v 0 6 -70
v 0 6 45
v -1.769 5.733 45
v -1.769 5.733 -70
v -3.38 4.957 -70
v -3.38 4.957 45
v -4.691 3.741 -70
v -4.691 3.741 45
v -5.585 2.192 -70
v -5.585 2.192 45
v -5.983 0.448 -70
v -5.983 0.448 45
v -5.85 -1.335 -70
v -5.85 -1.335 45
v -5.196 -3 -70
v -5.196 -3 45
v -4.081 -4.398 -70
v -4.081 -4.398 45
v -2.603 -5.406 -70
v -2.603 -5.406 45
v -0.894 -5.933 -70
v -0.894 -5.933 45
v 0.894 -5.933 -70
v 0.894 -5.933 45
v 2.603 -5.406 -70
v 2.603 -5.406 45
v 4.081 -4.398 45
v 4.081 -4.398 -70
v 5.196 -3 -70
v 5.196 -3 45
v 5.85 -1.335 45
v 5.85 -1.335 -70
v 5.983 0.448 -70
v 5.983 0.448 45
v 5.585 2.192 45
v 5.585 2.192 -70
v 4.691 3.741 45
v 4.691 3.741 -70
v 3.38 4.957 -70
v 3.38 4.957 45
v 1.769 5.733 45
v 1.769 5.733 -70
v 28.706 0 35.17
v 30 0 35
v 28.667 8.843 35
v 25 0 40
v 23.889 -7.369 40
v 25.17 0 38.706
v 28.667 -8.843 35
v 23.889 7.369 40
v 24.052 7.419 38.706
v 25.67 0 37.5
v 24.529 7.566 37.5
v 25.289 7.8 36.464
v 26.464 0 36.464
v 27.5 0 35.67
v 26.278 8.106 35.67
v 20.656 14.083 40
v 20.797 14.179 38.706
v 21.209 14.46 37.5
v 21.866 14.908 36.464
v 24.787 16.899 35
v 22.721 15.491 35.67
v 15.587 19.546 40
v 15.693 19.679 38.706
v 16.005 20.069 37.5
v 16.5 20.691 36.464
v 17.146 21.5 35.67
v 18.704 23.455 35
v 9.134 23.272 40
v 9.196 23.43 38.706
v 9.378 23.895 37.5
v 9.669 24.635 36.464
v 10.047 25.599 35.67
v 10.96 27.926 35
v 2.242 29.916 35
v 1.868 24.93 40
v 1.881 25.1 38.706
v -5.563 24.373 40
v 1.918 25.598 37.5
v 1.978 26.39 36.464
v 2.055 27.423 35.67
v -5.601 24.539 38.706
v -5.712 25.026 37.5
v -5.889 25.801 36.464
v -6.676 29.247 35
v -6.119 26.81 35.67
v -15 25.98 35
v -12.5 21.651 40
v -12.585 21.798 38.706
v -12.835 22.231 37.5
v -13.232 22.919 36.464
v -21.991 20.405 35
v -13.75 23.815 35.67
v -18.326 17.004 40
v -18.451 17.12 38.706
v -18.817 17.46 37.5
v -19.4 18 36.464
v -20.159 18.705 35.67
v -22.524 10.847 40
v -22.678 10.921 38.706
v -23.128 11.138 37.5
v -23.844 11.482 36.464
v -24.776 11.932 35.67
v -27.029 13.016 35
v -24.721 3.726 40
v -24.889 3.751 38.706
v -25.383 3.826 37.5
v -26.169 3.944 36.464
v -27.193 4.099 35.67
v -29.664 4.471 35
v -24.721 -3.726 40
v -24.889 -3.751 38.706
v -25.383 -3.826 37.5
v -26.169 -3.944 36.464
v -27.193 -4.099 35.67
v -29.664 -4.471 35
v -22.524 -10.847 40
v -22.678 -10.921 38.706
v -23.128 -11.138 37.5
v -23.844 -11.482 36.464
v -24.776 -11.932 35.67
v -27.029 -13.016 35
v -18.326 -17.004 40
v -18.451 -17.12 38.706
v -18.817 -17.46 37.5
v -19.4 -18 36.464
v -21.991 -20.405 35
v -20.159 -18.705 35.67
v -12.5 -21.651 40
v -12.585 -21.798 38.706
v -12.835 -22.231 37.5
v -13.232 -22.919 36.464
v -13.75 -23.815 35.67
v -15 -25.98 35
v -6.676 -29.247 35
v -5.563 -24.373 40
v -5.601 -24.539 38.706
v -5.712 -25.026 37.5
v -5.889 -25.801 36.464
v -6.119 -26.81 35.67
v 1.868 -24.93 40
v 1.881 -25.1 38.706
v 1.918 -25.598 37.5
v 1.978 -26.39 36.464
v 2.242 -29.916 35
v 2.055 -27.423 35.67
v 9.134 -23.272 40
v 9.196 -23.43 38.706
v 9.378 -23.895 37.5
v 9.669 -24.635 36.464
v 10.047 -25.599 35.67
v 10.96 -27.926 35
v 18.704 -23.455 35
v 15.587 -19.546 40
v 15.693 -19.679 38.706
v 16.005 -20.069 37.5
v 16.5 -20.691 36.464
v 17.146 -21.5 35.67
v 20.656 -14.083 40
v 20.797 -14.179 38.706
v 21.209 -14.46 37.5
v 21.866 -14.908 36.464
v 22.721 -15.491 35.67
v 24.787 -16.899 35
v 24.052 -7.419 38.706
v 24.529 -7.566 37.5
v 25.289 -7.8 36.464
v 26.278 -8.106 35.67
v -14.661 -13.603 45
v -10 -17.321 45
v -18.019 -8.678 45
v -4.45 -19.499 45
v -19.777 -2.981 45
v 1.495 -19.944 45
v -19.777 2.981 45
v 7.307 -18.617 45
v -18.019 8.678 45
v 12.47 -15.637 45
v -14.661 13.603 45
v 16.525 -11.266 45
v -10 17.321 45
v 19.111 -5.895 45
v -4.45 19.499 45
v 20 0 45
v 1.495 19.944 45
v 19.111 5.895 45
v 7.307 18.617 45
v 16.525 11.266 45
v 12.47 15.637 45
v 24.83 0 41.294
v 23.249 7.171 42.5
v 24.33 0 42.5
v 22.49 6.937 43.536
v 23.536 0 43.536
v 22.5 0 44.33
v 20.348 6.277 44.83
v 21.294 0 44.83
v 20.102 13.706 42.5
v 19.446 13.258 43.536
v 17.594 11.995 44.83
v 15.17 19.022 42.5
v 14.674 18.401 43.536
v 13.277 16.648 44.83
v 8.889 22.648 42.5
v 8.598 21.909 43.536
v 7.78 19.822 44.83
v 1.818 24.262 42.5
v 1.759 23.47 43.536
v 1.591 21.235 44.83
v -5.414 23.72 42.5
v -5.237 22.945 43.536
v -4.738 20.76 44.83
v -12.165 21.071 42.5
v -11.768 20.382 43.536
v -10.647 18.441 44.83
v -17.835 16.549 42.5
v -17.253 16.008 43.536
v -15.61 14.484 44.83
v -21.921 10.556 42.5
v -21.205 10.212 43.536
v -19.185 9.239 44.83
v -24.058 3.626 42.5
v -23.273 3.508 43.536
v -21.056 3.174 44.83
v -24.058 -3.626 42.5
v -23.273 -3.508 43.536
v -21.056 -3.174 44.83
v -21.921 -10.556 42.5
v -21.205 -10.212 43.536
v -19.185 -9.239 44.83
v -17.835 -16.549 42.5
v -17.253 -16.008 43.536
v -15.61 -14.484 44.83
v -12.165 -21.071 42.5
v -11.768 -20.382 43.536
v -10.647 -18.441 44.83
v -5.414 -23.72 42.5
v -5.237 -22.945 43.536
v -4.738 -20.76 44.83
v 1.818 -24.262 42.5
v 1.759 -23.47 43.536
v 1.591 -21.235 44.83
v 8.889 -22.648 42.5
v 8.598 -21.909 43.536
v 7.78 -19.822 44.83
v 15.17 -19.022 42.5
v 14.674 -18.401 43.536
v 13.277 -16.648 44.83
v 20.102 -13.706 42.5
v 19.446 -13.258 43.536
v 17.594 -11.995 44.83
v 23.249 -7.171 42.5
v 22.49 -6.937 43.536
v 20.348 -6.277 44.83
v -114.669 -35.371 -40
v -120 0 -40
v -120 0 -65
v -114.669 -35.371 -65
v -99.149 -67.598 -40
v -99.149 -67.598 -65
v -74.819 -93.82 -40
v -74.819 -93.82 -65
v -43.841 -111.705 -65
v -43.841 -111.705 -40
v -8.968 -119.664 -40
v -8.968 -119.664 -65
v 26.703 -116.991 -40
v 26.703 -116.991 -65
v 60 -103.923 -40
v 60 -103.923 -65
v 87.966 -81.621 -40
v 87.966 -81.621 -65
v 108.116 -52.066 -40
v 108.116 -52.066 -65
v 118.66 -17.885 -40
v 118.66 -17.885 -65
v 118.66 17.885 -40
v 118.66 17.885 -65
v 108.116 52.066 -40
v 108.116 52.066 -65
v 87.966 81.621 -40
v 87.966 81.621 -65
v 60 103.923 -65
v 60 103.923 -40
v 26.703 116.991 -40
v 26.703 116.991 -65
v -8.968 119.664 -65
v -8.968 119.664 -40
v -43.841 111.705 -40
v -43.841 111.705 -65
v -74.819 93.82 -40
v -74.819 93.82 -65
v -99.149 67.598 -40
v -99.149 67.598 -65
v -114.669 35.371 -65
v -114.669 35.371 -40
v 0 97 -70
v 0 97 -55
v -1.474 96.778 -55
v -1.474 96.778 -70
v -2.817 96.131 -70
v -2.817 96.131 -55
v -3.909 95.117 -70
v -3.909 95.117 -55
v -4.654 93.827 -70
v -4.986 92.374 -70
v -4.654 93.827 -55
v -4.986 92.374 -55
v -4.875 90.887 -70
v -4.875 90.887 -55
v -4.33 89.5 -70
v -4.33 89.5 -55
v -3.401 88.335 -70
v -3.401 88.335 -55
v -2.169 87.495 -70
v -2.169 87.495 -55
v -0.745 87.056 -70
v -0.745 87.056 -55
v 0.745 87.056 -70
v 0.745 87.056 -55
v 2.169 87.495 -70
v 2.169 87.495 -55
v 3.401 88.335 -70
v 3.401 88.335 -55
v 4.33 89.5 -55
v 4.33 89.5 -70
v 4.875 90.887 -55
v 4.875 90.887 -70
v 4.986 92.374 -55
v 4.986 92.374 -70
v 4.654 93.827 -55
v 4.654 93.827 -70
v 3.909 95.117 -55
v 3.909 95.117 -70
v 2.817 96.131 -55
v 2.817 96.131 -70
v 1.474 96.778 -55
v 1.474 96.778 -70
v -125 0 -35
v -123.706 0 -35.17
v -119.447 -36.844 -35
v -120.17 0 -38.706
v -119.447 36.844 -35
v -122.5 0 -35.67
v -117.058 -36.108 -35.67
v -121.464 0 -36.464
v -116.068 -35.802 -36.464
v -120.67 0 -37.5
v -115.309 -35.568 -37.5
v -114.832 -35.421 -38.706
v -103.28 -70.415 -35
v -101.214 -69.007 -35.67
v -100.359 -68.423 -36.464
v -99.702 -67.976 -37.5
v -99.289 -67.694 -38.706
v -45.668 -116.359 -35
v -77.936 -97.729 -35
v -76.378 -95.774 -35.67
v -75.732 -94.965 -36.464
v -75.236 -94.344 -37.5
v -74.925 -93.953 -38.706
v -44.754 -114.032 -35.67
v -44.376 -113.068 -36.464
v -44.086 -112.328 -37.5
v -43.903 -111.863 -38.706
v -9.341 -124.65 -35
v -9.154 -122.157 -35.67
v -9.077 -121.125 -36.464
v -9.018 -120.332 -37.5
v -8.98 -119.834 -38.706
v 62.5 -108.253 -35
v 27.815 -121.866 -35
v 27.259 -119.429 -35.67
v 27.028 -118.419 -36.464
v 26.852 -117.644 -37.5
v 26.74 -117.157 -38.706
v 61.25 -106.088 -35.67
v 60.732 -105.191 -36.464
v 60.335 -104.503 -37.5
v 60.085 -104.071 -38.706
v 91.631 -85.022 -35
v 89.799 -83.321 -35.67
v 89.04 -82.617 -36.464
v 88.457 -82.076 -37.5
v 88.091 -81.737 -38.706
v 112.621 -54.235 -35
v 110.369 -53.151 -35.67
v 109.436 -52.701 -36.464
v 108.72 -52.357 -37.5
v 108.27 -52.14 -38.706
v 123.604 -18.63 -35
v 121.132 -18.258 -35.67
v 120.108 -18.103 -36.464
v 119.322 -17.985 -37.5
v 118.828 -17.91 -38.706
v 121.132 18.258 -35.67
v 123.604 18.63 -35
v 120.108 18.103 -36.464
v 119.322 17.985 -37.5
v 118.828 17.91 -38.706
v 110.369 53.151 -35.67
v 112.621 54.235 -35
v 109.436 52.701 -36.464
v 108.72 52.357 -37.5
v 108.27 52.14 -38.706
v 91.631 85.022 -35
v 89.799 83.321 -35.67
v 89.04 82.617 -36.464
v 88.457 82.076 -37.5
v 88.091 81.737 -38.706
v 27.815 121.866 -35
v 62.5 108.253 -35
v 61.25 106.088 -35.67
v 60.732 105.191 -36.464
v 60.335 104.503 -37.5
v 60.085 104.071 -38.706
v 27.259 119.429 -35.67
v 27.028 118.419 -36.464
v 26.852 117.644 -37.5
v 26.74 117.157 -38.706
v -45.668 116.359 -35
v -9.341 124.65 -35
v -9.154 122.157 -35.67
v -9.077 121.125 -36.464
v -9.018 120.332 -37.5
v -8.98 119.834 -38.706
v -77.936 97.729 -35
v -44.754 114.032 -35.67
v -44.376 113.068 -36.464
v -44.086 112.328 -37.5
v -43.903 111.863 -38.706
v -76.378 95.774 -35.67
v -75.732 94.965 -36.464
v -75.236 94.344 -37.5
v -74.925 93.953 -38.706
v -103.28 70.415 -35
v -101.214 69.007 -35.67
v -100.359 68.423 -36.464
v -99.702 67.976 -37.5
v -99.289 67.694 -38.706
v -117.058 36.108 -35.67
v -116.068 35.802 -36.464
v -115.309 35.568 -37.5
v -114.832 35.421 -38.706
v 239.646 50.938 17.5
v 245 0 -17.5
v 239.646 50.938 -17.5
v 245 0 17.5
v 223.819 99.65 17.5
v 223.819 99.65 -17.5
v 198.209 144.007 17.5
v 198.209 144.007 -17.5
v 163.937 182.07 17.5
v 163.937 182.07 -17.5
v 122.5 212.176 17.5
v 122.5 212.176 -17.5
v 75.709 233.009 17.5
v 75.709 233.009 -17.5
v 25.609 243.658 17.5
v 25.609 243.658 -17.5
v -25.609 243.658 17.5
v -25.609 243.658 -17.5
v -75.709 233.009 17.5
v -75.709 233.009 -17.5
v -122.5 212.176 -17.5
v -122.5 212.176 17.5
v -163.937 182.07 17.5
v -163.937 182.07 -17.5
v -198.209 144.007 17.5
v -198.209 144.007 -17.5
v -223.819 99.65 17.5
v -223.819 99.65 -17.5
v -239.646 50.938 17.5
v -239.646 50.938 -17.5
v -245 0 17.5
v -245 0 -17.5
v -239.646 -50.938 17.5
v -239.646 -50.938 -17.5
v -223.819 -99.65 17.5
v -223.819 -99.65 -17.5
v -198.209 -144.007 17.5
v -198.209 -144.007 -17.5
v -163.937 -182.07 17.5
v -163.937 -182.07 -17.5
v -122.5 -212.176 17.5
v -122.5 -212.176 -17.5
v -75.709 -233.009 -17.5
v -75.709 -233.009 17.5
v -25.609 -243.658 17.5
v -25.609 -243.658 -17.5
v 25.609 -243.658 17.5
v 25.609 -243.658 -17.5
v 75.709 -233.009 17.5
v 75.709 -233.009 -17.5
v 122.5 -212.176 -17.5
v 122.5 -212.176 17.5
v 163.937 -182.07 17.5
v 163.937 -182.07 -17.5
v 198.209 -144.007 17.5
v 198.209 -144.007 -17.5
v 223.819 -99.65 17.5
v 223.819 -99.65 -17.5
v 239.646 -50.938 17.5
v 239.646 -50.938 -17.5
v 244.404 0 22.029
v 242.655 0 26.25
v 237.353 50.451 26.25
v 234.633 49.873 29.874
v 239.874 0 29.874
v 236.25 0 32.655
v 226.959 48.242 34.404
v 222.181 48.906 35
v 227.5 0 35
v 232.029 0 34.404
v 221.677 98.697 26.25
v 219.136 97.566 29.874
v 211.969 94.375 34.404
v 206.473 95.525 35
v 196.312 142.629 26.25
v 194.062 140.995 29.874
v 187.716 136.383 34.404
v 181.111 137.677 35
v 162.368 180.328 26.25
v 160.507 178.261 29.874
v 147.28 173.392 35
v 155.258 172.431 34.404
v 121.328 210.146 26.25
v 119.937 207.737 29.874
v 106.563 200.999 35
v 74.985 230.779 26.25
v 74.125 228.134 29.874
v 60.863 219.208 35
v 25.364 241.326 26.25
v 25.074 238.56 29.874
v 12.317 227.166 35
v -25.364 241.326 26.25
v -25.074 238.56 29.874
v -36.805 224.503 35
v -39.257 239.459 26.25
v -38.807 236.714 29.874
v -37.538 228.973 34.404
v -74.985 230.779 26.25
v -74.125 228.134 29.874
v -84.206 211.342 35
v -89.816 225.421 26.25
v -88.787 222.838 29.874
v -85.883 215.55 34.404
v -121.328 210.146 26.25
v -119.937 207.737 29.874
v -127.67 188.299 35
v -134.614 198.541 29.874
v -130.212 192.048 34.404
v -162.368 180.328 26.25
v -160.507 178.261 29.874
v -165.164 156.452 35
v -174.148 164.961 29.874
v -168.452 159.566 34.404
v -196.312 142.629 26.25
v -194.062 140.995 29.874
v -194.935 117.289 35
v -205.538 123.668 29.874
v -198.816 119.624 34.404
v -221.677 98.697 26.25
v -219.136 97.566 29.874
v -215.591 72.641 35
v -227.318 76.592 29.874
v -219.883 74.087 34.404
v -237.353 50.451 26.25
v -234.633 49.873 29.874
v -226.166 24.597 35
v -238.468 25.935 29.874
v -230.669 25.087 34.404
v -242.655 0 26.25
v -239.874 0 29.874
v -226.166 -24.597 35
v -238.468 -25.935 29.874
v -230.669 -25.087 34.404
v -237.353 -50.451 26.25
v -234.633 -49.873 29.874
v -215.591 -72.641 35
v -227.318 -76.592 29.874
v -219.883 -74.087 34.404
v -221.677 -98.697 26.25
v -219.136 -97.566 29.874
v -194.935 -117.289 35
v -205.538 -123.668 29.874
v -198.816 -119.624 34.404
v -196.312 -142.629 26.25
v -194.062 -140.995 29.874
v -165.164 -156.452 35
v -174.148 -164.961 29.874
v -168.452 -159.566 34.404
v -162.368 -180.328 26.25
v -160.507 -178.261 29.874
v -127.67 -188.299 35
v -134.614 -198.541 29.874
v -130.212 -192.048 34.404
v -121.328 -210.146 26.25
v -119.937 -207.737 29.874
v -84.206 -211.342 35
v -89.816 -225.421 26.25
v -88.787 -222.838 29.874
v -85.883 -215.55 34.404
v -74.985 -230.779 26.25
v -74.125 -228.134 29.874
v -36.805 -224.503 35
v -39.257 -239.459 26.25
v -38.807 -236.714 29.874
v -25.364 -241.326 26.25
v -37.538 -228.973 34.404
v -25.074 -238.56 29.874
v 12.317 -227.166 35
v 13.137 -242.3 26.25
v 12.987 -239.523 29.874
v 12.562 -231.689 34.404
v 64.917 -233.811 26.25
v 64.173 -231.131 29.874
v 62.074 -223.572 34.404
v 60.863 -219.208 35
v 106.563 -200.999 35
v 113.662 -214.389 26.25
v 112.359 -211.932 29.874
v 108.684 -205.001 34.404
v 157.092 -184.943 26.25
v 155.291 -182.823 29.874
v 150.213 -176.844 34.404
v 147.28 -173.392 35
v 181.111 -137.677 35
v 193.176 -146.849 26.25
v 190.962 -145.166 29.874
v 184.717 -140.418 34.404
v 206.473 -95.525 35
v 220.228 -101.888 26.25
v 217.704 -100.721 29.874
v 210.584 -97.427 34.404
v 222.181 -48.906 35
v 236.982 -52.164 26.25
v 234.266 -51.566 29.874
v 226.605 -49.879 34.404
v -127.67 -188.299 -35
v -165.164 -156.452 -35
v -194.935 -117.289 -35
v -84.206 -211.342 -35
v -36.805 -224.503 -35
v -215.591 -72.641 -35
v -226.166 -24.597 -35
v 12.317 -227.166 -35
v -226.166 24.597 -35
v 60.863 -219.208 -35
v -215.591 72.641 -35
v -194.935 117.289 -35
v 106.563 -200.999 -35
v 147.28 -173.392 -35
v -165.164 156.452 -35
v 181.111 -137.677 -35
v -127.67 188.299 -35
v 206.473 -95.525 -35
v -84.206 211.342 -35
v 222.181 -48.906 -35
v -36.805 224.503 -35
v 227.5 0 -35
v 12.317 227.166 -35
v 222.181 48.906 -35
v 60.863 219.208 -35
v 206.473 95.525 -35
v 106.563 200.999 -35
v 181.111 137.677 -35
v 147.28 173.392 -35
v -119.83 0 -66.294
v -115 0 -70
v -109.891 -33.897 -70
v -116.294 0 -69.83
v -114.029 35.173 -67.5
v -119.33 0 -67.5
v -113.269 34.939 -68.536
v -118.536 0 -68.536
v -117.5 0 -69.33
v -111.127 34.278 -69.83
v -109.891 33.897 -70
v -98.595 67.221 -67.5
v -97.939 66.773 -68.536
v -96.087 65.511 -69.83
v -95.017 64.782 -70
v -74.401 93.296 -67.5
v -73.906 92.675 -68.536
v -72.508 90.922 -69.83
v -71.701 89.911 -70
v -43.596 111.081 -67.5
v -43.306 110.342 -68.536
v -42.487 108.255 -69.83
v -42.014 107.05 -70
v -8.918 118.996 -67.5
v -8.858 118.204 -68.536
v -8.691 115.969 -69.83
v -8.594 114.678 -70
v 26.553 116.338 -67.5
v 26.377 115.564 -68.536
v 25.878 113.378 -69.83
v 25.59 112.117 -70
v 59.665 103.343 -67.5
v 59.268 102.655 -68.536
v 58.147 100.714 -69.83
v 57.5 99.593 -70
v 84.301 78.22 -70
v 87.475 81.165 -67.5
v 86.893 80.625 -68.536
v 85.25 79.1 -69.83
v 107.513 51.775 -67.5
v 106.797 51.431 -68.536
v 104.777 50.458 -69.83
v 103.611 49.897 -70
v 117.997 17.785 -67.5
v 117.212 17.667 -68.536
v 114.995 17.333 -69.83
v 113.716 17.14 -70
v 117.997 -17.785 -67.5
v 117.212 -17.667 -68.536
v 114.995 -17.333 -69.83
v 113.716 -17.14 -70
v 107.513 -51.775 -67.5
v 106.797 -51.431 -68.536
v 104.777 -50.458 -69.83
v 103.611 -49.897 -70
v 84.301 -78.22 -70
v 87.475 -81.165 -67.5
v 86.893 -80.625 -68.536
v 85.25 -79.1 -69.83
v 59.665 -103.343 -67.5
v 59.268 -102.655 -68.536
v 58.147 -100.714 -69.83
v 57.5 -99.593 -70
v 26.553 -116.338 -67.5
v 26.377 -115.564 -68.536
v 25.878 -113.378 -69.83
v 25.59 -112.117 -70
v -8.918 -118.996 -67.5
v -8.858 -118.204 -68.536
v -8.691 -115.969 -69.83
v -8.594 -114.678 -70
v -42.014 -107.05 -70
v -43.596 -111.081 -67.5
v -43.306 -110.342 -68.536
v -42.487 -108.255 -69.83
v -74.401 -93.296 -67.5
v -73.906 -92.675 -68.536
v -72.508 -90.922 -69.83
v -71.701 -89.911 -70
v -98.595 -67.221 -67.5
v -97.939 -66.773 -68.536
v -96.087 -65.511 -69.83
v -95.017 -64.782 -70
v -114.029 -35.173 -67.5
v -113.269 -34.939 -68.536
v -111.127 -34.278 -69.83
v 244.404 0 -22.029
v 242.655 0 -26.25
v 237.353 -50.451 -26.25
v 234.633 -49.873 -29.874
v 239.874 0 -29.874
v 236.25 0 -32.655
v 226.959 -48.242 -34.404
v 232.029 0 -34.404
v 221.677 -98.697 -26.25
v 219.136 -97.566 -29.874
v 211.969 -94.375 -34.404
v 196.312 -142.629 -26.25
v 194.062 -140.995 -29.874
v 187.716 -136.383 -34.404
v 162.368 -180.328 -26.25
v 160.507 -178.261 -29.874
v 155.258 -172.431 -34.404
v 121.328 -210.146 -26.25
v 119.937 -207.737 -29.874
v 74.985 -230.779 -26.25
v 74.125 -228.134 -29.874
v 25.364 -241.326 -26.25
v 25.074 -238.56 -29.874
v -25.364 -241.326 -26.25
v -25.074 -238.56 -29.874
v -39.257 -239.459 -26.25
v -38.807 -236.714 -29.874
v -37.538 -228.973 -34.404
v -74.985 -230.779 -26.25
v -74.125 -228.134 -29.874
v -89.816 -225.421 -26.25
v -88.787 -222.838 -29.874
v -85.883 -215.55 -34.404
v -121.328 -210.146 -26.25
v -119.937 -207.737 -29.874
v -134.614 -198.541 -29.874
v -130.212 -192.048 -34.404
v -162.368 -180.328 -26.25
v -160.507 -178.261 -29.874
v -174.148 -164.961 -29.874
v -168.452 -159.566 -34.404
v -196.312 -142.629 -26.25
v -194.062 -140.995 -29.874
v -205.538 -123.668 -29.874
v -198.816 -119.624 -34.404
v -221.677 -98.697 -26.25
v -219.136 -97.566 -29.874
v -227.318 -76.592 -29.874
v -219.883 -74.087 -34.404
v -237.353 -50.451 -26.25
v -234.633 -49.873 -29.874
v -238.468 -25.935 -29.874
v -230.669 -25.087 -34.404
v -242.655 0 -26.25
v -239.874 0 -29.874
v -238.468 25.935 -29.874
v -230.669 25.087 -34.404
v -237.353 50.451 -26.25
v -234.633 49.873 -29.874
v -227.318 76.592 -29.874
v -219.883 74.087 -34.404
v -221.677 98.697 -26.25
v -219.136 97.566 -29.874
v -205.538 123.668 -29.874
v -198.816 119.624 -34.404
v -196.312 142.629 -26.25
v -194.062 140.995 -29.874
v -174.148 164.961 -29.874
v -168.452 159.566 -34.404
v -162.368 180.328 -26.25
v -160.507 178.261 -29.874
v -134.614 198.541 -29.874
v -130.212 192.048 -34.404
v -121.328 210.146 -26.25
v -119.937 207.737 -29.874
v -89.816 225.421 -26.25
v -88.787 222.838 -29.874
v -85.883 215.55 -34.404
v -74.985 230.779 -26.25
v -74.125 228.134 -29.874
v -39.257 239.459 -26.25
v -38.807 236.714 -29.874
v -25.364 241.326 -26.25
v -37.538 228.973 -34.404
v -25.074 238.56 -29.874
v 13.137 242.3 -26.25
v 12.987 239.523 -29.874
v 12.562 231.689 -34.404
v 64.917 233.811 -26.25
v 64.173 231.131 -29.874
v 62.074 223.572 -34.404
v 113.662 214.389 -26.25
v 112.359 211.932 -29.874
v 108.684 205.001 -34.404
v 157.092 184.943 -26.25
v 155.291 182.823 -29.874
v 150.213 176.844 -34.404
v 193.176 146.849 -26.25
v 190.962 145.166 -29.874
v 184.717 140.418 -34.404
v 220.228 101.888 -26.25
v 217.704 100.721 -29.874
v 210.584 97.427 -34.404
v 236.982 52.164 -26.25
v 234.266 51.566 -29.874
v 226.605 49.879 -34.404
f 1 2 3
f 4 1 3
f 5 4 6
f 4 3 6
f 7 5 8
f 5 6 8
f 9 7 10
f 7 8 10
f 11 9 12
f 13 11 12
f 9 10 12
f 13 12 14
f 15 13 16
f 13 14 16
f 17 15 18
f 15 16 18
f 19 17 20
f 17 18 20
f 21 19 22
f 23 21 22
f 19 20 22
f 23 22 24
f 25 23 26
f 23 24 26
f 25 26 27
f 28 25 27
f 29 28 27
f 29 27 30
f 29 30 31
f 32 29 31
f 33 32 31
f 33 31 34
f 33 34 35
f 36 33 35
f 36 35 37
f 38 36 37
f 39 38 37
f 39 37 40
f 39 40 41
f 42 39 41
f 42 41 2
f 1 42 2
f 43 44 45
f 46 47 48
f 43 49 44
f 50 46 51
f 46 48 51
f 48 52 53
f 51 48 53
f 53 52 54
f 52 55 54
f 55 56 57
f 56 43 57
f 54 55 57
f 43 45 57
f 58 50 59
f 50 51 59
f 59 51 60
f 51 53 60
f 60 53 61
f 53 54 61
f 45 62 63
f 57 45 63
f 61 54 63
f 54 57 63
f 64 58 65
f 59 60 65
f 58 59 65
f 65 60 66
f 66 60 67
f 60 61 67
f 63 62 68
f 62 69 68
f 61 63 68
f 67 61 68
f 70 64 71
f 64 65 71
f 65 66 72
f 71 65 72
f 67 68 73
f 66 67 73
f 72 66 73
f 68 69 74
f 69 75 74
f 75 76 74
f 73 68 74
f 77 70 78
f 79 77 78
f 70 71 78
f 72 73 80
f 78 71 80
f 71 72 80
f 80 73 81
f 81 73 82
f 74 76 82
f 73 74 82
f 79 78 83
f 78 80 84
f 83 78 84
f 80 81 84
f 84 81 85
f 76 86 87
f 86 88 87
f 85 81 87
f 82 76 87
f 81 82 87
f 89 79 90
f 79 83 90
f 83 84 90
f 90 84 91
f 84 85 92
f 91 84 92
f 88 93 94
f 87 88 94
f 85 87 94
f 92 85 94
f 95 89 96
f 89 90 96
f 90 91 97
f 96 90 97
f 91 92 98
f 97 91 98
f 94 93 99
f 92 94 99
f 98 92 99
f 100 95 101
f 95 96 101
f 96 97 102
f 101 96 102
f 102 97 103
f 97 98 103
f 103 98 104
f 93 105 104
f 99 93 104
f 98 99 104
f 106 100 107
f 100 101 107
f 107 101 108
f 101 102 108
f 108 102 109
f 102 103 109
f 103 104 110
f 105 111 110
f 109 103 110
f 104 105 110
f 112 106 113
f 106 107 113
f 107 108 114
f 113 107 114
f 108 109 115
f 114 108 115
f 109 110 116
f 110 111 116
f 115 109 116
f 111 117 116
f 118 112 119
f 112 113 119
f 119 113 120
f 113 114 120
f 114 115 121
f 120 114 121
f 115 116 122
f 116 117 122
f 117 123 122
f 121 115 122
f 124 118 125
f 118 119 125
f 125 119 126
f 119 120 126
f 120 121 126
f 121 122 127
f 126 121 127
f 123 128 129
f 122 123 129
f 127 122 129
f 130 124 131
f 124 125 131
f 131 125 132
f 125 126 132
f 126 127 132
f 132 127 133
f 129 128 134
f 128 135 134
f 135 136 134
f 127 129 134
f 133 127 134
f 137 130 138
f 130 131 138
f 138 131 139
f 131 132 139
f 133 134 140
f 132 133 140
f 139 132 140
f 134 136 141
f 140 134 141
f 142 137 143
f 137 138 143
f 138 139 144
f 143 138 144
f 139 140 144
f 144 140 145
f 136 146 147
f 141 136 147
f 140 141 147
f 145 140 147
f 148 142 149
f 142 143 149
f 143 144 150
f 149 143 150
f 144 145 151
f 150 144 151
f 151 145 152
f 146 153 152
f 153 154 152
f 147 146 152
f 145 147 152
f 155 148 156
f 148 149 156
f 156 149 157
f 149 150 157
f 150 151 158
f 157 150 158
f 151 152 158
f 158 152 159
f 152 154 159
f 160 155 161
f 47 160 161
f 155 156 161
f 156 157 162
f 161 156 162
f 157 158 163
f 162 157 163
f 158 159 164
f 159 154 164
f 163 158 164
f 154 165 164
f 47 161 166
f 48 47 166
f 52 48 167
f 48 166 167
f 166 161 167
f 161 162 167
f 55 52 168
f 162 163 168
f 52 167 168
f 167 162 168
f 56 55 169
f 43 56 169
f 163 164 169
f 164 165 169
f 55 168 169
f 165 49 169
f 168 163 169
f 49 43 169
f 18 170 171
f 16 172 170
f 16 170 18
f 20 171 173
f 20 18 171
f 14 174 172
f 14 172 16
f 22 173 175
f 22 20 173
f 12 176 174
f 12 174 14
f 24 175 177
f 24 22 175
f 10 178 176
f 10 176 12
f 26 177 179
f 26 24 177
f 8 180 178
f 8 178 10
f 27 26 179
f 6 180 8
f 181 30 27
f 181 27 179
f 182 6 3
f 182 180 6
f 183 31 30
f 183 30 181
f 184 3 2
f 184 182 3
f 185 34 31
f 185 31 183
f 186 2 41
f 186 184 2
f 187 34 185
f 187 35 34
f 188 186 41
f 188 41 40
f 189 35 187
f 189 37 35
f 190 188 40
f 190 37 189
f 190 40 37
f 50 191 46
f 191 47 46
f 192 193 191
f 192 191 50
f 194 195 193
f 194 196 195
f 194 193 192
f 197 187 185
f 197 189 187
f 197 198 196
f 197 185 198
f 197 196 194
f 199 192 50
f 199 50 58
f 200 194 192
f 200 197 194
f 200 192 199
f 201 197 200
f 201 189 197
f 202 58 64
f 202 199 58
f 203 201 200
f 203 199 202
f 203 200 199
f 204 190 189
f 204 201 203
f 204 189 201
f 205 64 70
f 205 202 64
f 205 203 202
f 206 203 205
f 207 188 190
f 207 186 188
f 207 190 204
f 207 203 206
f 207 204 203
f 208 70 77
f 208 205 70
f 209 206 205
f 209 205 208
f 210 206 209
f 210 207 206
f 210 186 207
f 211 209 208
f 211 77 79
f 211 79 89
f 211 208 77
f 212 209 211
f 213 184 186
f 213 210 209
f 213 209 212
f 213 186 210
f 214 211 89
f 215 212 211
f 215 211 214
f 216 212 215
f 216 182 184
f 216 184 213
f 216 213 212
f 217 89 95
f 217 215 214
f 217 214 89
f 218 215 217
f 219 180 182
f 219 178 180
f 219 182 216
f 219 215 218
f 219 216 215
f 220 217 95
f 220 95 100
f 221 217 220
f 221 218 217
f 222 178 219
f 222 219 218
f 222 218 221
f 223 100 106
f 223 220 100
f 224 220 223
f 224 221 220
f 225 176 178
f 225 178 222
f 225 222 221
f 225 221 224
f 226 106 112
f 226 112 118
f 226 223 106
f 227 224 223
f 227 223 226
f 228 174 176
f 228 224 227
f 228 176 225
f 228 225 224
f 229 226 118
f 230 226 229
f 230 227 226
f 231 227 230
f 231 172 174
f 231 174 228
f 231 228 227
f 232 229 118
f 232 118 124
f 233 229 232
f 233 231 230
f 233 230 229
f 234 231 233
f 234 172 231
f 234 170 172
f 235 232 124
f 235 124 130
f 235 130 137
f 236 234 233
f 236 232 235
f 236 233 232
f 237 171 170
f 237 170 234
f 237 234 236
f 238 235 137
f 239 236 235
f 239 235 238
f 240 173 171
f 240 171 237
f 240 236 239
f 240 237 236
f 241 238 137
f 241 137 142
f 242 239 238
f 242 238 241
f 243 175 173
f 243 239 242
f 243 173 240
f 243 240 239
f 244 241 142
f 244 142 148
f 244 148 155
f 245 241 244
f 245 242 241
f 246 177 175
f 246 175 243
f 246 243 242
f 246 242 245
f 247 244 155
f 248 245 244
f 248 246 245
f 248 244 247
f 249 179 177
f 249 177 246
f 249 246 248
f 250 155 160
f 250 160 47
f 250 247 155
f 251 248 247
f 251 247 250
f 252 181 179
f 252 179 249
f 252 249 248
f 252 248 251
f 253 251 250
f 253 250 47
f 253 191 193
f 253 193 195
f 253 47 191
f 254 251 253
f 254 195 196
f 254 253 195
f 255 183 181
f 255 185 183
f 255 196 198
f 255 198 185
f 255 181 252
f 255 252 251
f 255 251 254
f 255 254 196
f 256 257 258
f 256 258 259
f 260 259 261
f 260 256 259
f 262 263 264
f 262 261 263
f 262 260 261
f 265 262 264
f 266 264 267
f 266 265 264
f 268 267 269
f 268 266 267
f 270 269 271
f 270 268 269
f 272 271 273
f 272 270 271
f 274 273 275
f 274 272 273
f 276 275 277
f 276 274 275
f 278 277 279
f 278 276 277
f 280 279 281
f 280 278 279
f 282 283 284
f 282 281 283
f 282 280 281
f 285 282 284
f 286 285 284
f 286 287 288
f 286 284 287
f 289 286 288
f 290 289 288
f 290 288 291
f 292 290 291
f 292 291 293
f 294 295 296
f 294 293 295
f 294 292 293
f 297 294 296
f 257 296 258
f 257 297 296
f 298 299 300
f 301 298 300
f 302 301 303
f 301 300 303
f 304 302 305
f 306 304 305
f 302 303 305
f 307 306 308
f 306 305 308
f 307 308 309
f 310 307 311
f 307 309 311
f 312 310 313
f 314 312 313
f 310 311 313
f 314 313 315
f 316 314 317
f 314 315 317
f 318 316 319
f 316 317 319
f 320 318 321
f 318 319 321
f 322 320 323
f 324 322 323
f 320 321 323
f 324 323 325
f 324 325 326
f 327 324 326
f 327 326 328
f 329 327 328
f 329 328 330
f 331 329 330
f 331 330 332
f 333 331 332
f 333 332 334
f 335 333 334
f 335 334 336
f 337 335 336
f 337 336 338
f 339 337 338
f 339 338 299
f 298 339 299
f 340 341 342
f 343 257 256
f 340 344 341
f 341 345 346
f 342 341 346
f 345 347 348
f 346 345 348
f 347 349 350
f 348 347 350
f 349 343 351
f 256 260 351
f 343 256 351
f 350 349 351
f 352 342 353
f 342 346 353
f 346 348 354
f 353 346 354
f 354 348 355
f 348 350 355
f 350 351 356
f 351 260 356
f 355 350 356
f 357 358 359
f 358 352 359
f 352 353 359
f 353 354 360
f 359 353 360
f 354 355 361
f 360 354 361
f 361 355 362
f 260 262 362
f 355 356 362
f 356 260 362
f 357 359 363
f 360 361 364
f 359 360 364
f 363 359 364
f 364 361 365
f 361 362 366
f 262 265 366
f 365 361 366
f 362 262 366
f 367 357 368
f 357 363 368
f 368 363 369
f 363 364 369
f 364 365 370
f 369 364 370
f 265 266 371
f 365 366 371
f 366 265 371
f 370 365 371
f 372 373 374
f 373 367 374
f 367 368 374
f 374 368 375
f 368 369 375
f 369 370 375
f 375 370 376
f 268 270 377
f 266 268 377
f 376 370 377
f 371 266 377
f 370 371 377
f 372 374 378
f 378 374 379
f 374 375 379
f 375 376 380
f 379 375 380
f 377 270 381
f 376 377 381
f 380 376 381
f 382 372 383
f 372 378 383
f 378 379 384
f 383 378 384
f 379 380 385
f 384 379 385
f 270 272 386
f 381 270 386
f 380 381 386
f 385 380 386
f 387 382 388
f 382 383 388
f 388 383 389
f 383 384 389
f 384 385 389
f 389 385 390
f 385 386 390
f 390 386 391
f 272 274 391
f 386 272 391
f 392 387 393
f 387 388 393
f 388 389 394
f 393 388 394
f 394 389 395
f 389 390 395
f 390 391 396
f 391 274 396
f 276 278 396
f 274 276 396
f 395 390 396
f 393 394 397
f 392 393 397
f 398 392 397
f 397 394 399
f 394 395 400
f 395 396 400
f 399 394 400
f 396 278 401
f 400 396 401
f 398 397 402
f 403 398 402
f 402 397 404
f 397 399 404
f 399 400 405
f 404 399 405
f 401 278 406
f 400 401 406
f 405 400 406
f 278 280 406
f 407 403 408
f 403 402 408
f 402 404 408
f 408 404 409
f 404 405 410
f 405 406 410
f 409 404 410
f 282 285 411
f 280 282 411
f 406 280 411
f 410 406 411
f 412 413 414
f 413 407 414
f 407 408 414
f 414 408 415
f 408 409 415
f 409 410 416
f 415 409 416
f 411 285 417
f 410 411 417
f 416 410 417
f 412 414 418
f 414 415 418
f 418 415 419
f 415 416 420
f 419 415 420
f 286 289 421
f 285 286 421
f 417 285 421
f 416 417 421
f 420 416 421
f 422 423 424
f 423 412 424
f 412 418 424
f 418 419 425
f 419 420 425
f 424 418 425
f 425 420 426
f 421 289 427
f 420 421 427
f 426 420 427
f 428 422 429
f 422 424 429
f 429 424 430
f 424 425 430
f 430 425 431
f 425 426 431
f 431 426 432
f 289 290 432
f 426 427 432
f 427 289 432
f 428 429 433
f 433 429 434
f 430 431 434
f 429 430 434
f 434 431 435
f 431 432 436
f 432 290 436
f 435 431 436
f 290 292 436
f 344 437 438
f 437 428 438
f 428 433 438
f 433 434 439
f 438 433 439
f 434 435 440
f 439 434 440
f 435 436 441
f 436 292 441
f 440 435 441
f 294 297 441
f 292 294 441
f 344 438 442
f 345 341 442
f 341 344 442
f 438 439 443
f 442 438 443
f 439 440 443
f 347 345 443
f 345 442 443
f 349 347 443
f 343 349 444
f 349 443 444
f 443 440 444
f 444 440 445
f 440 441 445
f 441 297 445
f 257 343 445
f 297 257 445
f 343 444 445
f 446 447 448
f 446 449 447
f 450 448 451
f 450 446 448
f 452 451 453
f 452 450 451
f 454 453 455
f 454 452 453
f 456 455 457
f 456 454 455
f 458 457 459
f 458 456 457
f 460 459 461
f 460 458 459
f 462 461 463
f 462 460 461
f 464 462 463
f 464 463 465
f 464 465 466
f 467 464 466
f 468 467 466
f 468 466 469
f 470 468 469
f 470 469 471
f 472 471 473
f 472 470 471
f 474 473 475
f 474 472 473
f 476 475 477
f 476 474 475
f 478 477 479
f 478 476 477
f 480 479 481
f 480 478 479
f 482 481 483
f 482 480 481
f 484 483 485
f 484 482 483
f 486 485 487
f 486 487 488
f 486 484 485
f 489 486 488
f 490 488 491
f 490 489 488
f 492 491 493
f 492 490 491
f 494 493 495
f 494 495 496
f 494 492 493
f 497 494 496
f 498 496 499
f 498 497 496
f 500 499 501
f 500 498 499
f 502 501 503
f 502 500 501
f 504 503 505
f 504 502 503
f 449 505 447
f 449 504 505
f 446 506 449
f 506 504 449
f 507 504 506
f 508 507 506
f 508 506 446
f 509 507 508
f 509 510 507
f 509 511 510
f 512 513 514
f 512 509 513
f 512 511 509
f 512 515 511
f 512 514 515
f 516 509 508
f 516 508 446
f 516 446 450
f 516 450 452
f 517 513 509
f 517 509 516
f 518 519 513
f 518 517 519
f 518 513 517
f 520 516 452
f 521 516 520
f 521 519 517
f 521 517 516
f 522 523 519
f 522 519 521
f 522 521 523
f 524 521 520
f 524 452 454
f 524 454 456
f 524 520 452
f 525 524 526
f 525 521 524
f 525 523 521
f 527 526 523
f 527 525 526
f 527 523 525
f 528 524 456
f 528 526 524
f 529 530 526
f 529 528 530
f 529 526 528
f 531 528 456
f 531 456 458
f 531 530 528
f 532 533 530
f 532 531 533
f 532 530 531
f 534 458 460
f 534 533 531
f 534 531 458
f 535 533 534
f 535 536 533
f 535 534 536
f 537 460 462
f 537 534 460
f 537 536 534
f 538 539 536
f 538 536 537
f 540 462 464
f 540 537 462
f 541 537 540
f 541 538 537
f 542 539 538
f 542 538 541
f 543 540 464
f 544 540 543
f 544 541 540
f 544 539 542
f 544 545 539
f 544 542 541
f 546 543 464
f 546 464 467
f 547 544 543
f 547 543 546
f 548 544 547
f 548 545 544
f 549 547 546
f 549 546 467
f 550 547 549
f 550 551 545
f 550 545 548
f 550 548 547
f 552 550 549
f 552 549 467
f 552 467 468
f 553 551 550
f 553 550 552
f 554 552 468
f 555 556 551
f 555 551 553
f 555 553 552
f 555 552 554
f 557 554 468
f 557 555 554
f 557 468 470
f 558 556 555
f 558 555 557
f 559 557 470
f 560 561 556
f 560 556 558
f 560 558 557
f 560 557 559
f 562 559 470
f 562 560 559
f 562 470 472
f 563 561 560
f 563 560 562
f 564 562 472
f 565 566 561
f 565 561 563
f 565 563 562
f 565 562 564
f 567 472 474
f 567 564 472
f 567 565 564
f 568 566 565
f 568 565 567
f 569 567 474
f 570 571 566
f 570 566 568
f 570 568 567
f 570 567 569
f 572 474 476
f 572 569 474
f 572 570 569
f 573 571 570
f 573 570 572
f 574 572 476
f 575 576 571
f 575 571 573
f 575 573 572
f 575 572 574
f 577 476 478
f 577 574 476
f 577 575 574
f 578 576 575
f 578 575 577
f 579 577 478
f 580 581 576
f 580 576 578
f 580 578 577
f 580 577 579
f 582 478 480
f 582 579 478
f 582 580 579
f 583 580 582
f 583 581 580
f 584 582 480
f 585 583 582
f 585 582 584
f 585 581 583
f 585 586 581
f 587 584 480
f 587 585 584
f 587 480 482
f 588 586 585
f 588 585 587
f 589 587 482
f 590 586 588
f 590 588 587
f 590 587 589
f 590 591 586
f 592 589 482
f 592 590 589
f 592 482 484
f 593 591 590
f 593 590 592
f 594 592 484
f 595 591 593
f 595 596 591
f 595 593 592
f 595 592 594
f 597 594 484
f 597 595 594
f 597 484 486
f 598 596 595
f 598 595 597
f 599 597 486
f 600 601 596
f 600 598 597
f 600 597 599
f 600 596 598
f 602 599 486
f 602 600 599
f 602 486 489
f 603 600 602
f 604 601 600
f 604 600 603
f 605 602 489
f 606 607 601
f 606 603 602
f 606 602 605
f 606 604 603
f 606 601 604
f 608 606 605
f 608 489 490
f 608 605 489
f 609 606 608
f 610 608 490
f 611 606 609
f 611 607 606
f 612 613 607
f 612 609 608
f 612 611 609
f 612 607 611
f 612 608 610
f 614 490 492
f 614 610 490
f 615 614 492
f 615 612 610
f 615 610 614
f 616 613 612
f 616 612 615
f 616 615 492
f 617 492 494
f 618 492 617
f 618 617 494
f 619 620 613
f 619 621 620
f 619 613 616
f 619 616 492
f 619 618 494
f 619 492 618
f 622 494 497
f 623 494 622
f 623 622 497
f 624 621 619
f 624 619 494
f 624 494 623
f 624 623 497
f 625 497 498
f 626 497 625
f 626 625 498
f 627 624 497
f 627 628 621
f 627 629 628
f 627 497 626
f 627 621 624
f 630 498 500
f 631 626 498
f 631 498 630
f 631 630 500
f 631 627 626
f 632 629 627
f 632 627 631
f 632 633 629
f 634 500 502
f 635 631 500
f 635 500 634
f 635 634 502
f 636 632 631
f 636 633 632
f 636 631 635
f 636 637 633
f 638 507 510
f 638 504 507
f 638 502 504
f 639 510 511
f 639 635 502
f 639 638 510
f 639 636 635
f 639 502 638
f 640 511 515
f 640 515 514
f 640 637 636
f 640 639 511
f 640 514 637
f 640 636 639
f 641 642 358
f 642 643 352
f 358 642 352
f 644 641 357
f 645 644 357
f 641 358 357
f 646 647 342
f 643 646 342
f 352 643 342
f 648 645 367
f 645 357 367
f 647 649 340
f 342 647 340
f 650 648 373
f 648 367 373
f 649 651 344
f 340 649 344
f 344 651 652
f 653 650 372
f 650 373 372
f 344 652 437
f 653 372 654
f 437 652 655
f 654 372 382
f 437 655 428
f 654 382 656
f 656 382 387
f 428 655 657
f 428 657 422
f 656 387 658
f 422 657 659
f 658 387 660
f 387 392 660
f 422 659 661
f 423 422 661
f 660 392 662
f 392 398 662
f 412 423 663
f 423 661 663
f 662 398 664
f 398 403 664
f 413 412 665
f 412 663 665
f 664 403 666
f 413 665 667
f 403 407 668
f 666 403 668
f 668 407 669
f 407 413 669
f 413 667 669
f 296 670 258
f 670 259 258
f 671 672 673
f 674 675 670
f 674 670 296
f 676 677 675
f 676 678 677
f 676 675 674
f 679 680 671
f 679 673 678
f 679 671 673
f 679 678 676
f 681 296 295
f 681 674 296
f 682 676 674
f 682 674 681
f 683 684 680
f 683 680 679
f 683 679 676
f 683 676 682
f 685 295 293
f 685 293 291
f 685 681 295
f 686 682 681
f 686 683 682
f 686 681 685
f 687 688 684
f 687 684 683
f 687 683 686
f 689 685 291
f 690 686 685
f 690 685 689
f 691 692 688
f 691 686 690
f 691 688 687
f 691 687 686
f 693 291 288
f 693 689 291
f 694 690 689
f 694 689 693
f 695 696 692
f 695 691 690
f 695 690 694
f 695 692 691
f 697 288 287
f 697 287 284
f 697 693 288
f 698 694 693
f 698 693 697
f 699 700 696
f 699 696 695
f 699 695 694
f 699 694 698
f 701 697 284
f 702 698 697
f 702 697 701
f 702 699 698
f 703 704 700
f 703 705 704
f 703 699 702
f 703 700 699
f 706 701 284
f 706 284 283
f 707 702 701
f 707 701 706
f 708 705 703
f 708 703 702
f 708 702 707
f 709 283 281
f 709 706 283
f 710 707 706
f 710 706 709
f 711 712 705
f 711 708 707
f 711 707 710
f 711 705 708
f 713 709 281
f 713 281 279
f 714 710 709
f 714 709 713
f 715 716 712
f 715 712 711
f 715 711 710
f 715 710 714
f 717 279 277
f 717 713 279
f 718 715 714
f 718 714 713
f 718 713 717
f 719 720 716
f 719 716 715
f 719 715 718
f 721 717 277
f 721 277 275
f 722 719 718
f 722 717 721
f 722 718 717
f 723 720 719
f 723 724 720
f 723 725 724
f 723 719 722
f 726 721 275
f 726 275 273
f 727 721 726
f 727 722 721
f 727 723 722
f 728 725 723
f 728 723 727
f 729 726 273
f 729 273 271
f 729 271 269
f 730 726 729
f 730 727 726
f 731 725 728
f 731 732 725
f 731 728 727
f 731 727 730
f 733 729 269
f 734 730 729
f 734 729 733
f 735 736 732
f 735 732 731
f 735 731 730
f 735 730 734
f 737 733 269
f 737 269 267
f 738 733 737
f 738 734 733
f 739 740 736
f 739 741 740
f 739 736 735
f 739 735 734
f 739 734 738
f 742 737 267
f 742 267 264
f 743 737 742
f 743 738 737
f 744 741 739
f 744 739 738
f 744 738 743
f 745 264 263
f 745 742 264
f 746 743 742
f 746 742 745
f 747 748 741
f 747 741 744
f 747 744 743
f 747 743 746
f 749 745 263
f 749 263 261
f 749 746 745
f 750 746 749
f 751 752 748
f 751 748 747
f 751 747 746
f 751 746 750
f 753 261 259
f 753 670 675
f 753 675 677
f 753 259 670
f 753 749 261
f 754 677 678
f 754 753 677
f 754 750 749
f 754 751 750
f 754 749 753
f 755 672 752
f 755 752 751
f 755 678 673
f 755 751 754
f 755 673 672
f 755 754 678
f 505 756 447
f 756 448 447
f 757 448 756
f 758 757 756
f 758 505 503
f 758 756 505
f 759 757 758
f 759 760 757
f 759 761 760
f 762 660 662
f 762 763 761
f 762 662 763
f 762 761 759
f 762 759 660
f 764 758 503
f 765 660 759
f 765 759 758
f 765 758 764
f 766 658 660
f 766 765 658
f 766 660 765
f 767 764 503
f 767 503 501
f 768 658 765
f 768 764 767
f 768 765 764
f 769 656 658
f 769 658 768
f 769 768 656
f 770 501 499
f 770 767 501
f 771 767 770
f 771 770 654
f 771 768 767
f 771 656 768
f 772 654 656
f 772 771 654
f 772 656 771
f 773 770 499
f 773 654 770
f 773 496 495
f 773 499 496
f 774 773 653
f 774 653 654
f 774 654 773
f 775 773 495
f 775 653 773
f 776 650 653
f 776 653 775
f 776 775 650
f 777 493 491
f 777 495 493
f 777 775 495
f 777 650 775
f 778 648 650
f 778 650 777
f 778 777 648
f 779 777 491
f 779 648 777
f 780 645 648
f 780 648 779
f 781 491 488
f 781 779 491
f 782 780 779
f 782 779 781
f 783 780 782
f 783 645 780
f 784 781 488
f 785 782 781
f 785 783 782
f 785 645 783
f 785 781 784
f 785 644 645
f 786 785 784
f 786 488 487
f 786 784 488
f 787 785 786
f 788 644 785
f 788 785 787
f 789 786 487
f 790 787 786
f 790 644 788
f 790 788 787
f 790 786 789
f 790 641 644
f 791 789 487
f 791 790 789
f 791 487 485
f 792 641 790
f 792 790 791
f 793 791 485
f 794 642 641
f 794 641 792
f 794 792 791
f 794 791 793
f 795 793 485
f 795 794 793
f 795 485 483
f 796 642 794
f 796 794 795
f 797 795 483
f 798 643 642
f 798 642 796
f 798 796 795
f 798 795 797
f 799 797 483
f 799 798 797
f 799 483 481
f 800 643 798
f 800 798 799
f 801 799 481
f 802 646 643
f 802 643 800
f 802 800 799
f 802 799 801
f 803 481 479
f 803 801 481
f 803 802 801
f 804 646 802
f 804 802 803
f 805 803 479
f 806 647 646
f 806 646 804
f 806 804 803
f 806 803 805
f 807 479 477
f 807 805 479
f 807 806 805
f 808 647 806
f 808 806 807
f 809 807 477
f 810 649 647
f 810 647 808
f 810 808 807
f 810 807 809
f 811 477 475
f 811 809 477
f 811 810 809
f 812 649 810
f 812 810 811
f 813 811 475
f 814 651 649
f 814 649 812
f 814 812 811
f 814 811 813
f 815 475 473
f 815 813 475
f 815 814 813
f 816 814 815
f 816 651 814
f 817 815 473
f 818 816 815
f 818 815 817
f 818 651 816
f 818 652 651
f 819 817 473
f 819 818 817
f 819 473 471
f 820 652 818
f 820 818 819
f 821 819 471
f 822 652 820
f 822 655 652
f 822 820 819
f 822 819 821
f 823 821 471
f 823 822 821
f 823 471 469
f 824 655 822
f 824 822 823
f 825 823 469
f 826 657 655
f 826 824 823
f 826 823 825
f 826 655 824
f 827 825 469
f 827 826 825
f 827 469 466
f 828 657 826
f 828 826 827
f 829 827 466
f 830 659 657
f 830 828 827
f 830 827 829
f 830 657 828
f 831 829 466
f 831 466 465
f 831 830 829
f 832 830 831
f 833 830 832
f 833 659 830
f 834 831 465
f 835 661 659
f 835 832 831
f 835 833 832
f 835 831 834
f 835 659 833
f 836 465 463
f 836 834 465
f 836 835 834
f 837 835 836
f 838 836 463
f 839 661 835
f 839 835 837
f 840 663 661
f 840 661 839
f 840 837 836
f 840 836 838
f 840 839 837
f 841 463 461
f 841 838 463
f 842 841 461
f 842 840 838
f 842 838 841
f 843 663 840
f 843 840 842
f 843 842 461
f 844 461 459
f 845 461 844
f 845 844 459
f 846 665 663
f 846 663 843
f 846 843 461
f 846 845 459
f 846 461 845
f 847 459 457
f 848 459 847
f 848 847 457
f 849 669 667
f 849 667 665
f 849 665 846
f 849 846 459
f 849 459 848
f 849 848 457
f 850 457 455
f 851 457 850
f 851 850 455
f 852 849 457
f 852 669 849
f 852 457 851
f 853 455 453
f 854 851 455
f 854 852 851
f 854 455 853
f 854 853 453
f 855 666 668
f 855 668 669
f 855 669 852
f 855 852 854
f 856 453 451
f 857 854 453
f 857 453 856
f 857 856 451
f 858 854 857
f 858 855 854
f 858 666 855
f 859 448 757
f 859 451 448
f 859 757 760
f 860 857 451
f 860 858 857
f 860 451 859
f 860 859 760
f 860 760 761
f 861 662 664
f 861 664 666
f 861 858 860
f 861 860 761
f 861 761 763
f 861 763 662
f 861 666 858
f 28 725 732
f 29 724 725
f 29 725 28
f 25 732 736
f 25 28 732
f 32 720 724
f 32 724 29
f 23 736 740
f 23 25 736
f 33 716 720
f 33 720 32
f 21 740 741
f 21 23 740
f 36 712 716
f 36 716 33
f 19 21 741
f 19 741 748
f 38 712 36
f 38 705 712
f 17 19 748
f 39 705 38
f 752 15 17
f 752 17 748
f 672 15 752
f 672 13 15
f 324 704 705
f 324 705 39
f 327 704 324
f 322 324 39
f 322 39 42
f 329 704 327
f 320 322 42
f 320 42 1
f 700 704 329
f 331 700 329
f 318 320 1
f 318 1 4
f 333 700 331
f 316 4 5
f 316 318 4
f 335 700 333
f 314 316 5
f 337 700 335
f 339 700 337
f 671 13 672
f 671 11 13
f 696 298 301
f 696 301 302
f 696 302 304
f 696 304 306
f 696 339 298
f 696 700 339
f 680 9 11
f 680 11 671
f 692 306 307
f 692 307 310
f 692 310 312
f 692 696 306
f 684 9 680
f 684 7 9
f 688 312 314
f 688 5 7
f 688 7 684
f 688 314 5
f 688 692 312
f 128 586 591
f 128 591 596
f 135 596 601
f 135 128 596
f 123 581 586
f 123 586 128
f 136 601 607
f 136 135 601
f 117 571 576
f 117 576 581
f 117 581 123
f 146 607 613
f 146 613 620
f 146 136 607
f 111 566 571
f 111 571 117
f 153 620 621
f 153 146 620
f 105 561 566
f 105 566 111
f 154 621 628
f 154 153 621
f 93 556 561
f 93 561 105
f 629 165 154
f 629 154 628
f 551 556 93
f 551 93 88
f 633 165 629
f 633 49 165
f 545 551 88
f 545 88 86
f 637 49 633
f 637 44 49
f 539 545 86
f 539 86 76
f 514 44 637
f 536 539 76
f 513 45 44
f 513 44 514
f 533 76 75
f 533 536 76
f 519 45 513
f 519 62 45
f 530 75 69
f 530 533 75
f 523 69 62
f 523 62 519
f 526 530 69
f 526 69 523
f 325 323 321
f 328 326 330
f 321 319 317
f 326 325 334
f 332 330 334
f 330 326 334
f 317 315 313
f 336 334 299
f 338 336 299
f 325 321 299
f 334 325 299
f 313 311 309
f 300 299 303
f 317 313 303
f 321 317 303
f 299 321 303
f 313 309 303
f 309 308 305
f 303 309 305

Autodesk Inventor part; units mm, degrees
ref_plane "YZ Plane" through (0, 0, 0) normal (1, 0, 0) x (0, 1, 0)
ref_plane "XZ Plane" through (0, 0, 0) normal (0, 1, 0) x (-1, 0, 0)
ref_plane "XY Plane" through (0, 0, 0) normal (0, 0, 1) x (1, 0, 0)
sketch "スケッチ1" plane through (0, 0, 0) normal (0, 0, 1) x (1, 0, 0)
  circle A0 centre (0, 0) radius 245
  dimension "d0" = 490
extrude "押し出し1" add sketch "スケッチ1" along normal mid plane 70
fillet "フィレット1" radius 17.5 2 edges at (-245, 0, 35) (-245, 0, -35)
sketch "スケッチ8" plane through (0, 0, 35) normal (0, 0, 1) x (1, 0, 0)
  circle A0 centre (0, 0) radius 25
  dimension "d11" = 50
extrude "押し出し2" add sketch "スケッチ8" along normal blind 10
sketch "スケッチ9" plane through (0, 0, -35) normal (0, 0, -1) x (-1, 0, 0)
  circle A0 centre (0, 0) radius 120
  dimension "d14" = 240
extrude "押し出し3" add sketch "スケッチ9" along normal blind 35
fillet "フィレット2" radius 5 1 edges at (-25, 0, 45)
fillet "フィレット3" radius 5 1 edges at (-25, 0, 35)
fillet "フィレット4" radius 5 2 edges at (120, 0, -70) (120, 0, -35)
sketch "スケッチ10" plane through (0, 0, -70) normal (0, 0, -1) x (-1, 0, 0)
  point P0 (0, 0)
  point P1 (0, 0)
hole "穴2" at (0, 0, -70) direction (0, 0, 1) diameter 12 end through all
sketch "スケッチ11" plane through (0, 0, -70) normal (0, 0, -1) x (-1, 0, 0)
  point P0 (0, 0)
  point P1 (0, 92)
  dimension "d28" = 92
hole "穴3" at (0, 92, -70) direction (0, 0, 1) diameter 10 depth 15
properties part number "前輪"
